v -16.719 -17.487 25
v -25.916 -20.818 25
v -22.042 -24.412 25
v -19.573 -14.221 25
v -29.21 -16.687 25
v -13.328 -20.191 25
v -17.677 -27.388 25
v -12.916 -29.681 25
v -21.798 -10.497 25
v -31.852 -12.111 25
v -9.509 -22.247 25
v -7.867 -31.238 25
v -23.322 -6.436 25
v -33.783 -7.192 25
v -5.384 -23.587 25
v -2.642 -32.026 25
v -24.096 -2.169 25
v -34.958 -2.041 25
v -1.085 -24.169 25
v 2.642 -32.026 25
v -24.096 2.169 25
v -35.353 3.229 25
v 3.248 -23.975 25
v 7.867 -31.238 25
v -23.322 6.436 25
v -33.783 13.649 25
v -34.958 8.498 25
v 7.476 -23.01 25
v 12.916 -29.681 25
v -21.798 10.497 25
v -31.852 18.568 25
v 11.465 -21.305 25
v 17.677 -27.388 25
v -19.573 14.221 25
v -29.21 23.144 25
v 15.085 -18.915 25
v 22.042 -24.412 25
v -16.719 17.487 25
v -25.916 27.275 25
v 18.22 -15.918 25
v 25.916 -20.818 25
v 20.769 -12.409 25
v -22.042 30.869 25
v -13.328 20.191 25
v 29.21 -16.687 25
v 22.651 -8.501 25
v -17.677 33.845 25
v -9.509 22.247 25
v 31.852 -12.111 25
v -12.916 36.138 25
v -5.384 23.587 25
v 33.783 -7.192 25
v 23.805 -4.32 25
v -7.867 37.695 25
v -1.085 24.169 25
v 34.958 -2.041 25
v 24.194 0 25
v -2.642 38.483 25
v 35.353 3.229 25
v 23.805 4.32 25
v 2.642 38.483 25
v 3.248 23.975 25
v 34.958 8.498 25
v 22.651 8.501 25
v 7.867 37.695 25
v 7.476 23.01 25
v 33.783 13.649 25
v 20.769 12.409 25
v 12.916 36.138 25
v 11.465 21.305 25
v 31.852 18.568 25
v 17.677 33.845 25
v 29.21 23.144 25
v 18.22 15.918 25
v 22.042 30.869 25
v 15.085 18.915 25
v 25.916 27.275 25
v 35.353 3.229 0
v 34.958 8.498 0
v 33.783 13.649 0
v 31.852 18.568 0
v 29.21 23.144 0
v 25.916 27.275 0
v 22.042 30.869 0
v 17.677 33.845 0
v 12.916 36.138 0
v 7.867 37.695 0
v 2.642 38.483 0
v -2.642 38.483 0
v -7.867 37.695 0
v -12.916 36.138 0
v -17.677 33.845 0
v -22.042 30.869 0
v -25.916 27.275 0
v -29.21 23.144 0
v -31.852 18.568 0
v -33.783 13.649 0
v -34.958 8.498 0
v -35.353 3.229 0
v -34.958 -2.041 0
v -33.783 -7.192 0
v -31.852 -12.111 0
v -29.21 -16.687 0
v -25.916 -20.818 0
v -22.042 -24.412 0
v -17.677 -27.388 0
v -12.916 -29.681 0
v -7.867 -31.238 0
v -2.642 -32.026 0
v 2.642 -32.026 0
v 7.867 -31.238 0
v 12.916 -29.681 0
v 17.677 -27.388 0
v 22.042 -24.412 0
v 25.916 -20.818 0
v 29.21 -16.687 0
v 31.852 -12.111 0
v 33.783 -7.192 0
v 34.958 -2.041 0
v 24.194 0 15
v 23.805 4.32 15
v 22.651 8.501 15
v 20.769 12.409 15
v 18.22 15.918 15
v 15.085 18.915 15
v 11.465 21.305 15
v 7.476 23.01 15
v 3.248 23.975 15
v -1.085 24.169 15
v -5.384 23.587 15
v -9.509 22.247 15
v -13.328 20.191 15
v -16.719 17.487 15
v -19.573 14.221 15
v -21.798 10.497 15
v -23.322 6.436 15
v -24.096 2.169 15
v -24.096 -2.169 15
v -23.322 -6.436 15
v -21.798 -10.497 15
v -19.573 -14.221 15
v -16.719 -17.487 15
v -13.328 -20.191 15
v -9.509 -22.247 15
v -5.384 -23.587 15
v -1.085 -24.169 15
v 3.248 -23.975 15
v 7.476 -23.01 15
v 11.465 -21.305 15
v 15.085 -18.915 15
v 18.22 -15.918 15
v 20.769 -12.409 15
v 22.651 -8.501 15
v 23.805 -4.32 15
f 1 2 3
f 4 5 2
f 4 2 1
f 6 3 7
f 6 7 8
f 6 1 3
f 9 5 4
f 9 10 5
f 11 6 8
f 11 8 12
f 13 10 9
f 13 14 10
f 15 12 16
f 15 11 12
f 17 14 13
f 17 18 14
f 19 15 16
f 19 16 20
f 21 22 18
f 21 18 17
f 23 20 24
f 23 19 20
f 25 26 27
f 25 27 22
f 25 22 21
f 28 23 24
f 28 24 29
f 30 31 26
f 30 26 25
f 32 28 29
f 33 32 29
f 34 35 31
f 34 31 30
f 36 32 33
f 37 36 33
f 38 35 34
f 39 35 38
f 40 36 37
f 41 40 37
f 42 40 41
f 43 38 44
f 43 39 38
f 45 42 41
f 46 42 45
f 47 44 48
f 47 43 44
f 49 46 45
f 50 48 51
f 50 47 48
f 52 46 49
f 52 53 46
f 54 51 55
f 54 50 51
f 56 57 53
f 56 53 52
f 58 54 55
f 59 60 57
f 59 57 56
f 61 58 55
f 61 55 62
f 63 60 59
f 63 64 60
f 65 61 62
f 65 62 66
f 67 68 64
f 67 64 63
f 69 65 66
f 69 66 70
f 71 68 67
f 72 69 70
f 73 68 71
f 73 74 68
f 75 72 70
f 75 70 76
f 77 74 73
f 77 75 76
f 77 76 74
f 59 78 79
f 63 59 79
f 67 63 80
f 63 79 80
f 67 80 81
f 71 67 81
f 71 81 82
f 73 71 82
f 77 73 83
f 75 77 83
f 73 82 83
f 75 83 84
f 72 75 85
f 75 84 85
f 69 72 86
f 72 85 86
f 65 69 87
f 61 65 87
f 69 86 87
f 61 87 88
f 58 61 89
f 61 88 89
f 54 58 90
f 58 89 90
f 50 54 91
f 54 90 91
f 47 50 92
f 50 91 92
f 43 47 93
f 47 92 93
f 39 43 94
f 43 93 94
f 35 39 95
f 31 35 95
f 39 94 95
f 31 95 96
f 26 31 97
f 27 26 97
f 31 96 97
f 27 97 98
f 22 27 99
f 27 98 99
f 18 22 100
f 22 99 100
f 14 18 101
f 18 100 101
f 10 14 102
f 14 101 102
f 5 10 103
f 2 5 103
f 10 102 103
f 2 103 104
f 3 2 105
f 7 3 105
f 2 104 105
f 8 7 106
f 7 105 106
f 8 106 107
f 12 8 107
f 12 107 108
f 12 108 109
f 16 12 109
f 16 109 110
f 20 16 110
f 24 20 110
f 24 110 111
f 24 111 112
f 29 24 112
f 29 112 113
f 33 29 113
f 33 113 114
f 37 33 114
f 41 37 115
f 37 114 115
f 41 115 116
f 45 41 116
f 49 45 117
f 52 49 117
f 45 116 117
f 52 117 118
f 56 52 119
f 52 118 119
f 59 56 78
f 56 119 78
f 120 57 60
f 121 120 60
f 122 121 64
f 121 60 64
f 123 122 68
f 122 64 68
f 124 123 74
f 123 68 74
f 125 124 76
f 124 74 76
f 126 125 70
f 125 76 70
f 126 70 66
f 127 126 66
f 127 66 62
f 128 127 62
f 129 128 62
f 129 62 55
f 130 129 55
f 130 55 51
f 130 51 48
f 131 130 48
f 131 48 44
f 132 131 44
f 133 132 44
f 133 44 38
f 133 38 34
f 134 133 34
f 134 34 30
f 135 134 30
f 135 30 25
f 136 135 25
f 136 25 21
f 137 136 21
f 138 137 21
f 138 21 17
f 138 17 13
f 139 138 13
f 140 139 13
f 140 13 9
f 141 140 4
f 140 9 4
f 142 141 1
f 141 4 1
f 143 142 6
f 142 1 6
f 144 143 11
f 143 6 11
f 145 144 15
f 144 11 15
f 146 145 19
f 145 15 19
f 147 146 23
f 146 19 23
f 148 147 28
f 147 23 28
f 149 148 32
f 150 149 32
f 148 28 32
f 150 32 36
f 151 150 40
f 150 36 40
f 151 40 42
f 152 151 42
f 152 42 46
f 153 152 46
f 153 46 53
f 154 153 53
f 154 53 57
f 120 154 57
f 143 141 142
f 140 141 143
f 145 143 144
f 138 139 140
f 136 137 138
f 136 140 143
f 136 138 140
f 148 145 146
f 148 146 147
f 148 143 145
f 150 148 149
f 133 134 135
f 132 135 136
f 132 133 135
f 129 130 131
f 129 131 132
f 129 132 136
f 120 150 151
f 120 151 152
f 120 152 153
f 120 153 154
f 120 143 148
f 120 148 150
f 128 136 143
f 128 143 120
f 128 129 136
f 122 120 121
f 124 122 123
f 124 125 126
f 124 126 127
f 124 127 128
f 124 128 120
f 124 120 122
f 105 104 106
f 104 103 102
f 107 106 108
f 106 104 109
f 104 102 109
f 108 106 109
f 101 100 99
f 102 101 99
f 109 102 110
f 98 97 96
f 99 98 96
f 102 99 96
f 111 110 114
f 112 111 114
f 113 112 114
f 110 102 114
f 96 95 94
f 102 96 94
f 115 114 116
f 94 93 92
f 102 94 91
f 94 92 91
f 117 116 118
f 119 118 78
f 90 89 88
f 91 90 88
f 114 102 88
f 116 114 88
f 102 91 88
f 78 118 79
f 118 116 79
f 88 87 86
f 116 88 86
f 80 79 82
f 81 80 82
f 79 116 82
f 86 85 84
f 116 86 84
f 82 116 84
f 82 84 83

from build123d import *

# Parameters (mm, degrees)
F0_R      = 35.353158
F1_DEPTH  = 25
F2_R      = 24.193713
F3_DEPTH  = 15
F3_FACE_R = 24.193713
F4_DEPTH  = 25


with BuildPart() as f1:
    # F0 (on Top) → F1 (new body)
    with BuildSketch(Plane.XY):
        with Locations((0, 3.22861)):
            Circle(F0_R)
    extrude(amount=F1_DEPTH)

    # F2 (on face) → F3 (join)
    with BuildSketch(Plane.XY.offset(25)):
        Circle(F2_R)
    extrude(amount=F3_DEPTH)

    # F3_face (on face) → F4 (cut)
    with BuildSketch(Plane.XY.offset(40)):
        Circle(F3_FACE_R)
    extrude(amount=-F4_DEPTH, mode=Mode.SUBTRACT)


solid = f1.part
